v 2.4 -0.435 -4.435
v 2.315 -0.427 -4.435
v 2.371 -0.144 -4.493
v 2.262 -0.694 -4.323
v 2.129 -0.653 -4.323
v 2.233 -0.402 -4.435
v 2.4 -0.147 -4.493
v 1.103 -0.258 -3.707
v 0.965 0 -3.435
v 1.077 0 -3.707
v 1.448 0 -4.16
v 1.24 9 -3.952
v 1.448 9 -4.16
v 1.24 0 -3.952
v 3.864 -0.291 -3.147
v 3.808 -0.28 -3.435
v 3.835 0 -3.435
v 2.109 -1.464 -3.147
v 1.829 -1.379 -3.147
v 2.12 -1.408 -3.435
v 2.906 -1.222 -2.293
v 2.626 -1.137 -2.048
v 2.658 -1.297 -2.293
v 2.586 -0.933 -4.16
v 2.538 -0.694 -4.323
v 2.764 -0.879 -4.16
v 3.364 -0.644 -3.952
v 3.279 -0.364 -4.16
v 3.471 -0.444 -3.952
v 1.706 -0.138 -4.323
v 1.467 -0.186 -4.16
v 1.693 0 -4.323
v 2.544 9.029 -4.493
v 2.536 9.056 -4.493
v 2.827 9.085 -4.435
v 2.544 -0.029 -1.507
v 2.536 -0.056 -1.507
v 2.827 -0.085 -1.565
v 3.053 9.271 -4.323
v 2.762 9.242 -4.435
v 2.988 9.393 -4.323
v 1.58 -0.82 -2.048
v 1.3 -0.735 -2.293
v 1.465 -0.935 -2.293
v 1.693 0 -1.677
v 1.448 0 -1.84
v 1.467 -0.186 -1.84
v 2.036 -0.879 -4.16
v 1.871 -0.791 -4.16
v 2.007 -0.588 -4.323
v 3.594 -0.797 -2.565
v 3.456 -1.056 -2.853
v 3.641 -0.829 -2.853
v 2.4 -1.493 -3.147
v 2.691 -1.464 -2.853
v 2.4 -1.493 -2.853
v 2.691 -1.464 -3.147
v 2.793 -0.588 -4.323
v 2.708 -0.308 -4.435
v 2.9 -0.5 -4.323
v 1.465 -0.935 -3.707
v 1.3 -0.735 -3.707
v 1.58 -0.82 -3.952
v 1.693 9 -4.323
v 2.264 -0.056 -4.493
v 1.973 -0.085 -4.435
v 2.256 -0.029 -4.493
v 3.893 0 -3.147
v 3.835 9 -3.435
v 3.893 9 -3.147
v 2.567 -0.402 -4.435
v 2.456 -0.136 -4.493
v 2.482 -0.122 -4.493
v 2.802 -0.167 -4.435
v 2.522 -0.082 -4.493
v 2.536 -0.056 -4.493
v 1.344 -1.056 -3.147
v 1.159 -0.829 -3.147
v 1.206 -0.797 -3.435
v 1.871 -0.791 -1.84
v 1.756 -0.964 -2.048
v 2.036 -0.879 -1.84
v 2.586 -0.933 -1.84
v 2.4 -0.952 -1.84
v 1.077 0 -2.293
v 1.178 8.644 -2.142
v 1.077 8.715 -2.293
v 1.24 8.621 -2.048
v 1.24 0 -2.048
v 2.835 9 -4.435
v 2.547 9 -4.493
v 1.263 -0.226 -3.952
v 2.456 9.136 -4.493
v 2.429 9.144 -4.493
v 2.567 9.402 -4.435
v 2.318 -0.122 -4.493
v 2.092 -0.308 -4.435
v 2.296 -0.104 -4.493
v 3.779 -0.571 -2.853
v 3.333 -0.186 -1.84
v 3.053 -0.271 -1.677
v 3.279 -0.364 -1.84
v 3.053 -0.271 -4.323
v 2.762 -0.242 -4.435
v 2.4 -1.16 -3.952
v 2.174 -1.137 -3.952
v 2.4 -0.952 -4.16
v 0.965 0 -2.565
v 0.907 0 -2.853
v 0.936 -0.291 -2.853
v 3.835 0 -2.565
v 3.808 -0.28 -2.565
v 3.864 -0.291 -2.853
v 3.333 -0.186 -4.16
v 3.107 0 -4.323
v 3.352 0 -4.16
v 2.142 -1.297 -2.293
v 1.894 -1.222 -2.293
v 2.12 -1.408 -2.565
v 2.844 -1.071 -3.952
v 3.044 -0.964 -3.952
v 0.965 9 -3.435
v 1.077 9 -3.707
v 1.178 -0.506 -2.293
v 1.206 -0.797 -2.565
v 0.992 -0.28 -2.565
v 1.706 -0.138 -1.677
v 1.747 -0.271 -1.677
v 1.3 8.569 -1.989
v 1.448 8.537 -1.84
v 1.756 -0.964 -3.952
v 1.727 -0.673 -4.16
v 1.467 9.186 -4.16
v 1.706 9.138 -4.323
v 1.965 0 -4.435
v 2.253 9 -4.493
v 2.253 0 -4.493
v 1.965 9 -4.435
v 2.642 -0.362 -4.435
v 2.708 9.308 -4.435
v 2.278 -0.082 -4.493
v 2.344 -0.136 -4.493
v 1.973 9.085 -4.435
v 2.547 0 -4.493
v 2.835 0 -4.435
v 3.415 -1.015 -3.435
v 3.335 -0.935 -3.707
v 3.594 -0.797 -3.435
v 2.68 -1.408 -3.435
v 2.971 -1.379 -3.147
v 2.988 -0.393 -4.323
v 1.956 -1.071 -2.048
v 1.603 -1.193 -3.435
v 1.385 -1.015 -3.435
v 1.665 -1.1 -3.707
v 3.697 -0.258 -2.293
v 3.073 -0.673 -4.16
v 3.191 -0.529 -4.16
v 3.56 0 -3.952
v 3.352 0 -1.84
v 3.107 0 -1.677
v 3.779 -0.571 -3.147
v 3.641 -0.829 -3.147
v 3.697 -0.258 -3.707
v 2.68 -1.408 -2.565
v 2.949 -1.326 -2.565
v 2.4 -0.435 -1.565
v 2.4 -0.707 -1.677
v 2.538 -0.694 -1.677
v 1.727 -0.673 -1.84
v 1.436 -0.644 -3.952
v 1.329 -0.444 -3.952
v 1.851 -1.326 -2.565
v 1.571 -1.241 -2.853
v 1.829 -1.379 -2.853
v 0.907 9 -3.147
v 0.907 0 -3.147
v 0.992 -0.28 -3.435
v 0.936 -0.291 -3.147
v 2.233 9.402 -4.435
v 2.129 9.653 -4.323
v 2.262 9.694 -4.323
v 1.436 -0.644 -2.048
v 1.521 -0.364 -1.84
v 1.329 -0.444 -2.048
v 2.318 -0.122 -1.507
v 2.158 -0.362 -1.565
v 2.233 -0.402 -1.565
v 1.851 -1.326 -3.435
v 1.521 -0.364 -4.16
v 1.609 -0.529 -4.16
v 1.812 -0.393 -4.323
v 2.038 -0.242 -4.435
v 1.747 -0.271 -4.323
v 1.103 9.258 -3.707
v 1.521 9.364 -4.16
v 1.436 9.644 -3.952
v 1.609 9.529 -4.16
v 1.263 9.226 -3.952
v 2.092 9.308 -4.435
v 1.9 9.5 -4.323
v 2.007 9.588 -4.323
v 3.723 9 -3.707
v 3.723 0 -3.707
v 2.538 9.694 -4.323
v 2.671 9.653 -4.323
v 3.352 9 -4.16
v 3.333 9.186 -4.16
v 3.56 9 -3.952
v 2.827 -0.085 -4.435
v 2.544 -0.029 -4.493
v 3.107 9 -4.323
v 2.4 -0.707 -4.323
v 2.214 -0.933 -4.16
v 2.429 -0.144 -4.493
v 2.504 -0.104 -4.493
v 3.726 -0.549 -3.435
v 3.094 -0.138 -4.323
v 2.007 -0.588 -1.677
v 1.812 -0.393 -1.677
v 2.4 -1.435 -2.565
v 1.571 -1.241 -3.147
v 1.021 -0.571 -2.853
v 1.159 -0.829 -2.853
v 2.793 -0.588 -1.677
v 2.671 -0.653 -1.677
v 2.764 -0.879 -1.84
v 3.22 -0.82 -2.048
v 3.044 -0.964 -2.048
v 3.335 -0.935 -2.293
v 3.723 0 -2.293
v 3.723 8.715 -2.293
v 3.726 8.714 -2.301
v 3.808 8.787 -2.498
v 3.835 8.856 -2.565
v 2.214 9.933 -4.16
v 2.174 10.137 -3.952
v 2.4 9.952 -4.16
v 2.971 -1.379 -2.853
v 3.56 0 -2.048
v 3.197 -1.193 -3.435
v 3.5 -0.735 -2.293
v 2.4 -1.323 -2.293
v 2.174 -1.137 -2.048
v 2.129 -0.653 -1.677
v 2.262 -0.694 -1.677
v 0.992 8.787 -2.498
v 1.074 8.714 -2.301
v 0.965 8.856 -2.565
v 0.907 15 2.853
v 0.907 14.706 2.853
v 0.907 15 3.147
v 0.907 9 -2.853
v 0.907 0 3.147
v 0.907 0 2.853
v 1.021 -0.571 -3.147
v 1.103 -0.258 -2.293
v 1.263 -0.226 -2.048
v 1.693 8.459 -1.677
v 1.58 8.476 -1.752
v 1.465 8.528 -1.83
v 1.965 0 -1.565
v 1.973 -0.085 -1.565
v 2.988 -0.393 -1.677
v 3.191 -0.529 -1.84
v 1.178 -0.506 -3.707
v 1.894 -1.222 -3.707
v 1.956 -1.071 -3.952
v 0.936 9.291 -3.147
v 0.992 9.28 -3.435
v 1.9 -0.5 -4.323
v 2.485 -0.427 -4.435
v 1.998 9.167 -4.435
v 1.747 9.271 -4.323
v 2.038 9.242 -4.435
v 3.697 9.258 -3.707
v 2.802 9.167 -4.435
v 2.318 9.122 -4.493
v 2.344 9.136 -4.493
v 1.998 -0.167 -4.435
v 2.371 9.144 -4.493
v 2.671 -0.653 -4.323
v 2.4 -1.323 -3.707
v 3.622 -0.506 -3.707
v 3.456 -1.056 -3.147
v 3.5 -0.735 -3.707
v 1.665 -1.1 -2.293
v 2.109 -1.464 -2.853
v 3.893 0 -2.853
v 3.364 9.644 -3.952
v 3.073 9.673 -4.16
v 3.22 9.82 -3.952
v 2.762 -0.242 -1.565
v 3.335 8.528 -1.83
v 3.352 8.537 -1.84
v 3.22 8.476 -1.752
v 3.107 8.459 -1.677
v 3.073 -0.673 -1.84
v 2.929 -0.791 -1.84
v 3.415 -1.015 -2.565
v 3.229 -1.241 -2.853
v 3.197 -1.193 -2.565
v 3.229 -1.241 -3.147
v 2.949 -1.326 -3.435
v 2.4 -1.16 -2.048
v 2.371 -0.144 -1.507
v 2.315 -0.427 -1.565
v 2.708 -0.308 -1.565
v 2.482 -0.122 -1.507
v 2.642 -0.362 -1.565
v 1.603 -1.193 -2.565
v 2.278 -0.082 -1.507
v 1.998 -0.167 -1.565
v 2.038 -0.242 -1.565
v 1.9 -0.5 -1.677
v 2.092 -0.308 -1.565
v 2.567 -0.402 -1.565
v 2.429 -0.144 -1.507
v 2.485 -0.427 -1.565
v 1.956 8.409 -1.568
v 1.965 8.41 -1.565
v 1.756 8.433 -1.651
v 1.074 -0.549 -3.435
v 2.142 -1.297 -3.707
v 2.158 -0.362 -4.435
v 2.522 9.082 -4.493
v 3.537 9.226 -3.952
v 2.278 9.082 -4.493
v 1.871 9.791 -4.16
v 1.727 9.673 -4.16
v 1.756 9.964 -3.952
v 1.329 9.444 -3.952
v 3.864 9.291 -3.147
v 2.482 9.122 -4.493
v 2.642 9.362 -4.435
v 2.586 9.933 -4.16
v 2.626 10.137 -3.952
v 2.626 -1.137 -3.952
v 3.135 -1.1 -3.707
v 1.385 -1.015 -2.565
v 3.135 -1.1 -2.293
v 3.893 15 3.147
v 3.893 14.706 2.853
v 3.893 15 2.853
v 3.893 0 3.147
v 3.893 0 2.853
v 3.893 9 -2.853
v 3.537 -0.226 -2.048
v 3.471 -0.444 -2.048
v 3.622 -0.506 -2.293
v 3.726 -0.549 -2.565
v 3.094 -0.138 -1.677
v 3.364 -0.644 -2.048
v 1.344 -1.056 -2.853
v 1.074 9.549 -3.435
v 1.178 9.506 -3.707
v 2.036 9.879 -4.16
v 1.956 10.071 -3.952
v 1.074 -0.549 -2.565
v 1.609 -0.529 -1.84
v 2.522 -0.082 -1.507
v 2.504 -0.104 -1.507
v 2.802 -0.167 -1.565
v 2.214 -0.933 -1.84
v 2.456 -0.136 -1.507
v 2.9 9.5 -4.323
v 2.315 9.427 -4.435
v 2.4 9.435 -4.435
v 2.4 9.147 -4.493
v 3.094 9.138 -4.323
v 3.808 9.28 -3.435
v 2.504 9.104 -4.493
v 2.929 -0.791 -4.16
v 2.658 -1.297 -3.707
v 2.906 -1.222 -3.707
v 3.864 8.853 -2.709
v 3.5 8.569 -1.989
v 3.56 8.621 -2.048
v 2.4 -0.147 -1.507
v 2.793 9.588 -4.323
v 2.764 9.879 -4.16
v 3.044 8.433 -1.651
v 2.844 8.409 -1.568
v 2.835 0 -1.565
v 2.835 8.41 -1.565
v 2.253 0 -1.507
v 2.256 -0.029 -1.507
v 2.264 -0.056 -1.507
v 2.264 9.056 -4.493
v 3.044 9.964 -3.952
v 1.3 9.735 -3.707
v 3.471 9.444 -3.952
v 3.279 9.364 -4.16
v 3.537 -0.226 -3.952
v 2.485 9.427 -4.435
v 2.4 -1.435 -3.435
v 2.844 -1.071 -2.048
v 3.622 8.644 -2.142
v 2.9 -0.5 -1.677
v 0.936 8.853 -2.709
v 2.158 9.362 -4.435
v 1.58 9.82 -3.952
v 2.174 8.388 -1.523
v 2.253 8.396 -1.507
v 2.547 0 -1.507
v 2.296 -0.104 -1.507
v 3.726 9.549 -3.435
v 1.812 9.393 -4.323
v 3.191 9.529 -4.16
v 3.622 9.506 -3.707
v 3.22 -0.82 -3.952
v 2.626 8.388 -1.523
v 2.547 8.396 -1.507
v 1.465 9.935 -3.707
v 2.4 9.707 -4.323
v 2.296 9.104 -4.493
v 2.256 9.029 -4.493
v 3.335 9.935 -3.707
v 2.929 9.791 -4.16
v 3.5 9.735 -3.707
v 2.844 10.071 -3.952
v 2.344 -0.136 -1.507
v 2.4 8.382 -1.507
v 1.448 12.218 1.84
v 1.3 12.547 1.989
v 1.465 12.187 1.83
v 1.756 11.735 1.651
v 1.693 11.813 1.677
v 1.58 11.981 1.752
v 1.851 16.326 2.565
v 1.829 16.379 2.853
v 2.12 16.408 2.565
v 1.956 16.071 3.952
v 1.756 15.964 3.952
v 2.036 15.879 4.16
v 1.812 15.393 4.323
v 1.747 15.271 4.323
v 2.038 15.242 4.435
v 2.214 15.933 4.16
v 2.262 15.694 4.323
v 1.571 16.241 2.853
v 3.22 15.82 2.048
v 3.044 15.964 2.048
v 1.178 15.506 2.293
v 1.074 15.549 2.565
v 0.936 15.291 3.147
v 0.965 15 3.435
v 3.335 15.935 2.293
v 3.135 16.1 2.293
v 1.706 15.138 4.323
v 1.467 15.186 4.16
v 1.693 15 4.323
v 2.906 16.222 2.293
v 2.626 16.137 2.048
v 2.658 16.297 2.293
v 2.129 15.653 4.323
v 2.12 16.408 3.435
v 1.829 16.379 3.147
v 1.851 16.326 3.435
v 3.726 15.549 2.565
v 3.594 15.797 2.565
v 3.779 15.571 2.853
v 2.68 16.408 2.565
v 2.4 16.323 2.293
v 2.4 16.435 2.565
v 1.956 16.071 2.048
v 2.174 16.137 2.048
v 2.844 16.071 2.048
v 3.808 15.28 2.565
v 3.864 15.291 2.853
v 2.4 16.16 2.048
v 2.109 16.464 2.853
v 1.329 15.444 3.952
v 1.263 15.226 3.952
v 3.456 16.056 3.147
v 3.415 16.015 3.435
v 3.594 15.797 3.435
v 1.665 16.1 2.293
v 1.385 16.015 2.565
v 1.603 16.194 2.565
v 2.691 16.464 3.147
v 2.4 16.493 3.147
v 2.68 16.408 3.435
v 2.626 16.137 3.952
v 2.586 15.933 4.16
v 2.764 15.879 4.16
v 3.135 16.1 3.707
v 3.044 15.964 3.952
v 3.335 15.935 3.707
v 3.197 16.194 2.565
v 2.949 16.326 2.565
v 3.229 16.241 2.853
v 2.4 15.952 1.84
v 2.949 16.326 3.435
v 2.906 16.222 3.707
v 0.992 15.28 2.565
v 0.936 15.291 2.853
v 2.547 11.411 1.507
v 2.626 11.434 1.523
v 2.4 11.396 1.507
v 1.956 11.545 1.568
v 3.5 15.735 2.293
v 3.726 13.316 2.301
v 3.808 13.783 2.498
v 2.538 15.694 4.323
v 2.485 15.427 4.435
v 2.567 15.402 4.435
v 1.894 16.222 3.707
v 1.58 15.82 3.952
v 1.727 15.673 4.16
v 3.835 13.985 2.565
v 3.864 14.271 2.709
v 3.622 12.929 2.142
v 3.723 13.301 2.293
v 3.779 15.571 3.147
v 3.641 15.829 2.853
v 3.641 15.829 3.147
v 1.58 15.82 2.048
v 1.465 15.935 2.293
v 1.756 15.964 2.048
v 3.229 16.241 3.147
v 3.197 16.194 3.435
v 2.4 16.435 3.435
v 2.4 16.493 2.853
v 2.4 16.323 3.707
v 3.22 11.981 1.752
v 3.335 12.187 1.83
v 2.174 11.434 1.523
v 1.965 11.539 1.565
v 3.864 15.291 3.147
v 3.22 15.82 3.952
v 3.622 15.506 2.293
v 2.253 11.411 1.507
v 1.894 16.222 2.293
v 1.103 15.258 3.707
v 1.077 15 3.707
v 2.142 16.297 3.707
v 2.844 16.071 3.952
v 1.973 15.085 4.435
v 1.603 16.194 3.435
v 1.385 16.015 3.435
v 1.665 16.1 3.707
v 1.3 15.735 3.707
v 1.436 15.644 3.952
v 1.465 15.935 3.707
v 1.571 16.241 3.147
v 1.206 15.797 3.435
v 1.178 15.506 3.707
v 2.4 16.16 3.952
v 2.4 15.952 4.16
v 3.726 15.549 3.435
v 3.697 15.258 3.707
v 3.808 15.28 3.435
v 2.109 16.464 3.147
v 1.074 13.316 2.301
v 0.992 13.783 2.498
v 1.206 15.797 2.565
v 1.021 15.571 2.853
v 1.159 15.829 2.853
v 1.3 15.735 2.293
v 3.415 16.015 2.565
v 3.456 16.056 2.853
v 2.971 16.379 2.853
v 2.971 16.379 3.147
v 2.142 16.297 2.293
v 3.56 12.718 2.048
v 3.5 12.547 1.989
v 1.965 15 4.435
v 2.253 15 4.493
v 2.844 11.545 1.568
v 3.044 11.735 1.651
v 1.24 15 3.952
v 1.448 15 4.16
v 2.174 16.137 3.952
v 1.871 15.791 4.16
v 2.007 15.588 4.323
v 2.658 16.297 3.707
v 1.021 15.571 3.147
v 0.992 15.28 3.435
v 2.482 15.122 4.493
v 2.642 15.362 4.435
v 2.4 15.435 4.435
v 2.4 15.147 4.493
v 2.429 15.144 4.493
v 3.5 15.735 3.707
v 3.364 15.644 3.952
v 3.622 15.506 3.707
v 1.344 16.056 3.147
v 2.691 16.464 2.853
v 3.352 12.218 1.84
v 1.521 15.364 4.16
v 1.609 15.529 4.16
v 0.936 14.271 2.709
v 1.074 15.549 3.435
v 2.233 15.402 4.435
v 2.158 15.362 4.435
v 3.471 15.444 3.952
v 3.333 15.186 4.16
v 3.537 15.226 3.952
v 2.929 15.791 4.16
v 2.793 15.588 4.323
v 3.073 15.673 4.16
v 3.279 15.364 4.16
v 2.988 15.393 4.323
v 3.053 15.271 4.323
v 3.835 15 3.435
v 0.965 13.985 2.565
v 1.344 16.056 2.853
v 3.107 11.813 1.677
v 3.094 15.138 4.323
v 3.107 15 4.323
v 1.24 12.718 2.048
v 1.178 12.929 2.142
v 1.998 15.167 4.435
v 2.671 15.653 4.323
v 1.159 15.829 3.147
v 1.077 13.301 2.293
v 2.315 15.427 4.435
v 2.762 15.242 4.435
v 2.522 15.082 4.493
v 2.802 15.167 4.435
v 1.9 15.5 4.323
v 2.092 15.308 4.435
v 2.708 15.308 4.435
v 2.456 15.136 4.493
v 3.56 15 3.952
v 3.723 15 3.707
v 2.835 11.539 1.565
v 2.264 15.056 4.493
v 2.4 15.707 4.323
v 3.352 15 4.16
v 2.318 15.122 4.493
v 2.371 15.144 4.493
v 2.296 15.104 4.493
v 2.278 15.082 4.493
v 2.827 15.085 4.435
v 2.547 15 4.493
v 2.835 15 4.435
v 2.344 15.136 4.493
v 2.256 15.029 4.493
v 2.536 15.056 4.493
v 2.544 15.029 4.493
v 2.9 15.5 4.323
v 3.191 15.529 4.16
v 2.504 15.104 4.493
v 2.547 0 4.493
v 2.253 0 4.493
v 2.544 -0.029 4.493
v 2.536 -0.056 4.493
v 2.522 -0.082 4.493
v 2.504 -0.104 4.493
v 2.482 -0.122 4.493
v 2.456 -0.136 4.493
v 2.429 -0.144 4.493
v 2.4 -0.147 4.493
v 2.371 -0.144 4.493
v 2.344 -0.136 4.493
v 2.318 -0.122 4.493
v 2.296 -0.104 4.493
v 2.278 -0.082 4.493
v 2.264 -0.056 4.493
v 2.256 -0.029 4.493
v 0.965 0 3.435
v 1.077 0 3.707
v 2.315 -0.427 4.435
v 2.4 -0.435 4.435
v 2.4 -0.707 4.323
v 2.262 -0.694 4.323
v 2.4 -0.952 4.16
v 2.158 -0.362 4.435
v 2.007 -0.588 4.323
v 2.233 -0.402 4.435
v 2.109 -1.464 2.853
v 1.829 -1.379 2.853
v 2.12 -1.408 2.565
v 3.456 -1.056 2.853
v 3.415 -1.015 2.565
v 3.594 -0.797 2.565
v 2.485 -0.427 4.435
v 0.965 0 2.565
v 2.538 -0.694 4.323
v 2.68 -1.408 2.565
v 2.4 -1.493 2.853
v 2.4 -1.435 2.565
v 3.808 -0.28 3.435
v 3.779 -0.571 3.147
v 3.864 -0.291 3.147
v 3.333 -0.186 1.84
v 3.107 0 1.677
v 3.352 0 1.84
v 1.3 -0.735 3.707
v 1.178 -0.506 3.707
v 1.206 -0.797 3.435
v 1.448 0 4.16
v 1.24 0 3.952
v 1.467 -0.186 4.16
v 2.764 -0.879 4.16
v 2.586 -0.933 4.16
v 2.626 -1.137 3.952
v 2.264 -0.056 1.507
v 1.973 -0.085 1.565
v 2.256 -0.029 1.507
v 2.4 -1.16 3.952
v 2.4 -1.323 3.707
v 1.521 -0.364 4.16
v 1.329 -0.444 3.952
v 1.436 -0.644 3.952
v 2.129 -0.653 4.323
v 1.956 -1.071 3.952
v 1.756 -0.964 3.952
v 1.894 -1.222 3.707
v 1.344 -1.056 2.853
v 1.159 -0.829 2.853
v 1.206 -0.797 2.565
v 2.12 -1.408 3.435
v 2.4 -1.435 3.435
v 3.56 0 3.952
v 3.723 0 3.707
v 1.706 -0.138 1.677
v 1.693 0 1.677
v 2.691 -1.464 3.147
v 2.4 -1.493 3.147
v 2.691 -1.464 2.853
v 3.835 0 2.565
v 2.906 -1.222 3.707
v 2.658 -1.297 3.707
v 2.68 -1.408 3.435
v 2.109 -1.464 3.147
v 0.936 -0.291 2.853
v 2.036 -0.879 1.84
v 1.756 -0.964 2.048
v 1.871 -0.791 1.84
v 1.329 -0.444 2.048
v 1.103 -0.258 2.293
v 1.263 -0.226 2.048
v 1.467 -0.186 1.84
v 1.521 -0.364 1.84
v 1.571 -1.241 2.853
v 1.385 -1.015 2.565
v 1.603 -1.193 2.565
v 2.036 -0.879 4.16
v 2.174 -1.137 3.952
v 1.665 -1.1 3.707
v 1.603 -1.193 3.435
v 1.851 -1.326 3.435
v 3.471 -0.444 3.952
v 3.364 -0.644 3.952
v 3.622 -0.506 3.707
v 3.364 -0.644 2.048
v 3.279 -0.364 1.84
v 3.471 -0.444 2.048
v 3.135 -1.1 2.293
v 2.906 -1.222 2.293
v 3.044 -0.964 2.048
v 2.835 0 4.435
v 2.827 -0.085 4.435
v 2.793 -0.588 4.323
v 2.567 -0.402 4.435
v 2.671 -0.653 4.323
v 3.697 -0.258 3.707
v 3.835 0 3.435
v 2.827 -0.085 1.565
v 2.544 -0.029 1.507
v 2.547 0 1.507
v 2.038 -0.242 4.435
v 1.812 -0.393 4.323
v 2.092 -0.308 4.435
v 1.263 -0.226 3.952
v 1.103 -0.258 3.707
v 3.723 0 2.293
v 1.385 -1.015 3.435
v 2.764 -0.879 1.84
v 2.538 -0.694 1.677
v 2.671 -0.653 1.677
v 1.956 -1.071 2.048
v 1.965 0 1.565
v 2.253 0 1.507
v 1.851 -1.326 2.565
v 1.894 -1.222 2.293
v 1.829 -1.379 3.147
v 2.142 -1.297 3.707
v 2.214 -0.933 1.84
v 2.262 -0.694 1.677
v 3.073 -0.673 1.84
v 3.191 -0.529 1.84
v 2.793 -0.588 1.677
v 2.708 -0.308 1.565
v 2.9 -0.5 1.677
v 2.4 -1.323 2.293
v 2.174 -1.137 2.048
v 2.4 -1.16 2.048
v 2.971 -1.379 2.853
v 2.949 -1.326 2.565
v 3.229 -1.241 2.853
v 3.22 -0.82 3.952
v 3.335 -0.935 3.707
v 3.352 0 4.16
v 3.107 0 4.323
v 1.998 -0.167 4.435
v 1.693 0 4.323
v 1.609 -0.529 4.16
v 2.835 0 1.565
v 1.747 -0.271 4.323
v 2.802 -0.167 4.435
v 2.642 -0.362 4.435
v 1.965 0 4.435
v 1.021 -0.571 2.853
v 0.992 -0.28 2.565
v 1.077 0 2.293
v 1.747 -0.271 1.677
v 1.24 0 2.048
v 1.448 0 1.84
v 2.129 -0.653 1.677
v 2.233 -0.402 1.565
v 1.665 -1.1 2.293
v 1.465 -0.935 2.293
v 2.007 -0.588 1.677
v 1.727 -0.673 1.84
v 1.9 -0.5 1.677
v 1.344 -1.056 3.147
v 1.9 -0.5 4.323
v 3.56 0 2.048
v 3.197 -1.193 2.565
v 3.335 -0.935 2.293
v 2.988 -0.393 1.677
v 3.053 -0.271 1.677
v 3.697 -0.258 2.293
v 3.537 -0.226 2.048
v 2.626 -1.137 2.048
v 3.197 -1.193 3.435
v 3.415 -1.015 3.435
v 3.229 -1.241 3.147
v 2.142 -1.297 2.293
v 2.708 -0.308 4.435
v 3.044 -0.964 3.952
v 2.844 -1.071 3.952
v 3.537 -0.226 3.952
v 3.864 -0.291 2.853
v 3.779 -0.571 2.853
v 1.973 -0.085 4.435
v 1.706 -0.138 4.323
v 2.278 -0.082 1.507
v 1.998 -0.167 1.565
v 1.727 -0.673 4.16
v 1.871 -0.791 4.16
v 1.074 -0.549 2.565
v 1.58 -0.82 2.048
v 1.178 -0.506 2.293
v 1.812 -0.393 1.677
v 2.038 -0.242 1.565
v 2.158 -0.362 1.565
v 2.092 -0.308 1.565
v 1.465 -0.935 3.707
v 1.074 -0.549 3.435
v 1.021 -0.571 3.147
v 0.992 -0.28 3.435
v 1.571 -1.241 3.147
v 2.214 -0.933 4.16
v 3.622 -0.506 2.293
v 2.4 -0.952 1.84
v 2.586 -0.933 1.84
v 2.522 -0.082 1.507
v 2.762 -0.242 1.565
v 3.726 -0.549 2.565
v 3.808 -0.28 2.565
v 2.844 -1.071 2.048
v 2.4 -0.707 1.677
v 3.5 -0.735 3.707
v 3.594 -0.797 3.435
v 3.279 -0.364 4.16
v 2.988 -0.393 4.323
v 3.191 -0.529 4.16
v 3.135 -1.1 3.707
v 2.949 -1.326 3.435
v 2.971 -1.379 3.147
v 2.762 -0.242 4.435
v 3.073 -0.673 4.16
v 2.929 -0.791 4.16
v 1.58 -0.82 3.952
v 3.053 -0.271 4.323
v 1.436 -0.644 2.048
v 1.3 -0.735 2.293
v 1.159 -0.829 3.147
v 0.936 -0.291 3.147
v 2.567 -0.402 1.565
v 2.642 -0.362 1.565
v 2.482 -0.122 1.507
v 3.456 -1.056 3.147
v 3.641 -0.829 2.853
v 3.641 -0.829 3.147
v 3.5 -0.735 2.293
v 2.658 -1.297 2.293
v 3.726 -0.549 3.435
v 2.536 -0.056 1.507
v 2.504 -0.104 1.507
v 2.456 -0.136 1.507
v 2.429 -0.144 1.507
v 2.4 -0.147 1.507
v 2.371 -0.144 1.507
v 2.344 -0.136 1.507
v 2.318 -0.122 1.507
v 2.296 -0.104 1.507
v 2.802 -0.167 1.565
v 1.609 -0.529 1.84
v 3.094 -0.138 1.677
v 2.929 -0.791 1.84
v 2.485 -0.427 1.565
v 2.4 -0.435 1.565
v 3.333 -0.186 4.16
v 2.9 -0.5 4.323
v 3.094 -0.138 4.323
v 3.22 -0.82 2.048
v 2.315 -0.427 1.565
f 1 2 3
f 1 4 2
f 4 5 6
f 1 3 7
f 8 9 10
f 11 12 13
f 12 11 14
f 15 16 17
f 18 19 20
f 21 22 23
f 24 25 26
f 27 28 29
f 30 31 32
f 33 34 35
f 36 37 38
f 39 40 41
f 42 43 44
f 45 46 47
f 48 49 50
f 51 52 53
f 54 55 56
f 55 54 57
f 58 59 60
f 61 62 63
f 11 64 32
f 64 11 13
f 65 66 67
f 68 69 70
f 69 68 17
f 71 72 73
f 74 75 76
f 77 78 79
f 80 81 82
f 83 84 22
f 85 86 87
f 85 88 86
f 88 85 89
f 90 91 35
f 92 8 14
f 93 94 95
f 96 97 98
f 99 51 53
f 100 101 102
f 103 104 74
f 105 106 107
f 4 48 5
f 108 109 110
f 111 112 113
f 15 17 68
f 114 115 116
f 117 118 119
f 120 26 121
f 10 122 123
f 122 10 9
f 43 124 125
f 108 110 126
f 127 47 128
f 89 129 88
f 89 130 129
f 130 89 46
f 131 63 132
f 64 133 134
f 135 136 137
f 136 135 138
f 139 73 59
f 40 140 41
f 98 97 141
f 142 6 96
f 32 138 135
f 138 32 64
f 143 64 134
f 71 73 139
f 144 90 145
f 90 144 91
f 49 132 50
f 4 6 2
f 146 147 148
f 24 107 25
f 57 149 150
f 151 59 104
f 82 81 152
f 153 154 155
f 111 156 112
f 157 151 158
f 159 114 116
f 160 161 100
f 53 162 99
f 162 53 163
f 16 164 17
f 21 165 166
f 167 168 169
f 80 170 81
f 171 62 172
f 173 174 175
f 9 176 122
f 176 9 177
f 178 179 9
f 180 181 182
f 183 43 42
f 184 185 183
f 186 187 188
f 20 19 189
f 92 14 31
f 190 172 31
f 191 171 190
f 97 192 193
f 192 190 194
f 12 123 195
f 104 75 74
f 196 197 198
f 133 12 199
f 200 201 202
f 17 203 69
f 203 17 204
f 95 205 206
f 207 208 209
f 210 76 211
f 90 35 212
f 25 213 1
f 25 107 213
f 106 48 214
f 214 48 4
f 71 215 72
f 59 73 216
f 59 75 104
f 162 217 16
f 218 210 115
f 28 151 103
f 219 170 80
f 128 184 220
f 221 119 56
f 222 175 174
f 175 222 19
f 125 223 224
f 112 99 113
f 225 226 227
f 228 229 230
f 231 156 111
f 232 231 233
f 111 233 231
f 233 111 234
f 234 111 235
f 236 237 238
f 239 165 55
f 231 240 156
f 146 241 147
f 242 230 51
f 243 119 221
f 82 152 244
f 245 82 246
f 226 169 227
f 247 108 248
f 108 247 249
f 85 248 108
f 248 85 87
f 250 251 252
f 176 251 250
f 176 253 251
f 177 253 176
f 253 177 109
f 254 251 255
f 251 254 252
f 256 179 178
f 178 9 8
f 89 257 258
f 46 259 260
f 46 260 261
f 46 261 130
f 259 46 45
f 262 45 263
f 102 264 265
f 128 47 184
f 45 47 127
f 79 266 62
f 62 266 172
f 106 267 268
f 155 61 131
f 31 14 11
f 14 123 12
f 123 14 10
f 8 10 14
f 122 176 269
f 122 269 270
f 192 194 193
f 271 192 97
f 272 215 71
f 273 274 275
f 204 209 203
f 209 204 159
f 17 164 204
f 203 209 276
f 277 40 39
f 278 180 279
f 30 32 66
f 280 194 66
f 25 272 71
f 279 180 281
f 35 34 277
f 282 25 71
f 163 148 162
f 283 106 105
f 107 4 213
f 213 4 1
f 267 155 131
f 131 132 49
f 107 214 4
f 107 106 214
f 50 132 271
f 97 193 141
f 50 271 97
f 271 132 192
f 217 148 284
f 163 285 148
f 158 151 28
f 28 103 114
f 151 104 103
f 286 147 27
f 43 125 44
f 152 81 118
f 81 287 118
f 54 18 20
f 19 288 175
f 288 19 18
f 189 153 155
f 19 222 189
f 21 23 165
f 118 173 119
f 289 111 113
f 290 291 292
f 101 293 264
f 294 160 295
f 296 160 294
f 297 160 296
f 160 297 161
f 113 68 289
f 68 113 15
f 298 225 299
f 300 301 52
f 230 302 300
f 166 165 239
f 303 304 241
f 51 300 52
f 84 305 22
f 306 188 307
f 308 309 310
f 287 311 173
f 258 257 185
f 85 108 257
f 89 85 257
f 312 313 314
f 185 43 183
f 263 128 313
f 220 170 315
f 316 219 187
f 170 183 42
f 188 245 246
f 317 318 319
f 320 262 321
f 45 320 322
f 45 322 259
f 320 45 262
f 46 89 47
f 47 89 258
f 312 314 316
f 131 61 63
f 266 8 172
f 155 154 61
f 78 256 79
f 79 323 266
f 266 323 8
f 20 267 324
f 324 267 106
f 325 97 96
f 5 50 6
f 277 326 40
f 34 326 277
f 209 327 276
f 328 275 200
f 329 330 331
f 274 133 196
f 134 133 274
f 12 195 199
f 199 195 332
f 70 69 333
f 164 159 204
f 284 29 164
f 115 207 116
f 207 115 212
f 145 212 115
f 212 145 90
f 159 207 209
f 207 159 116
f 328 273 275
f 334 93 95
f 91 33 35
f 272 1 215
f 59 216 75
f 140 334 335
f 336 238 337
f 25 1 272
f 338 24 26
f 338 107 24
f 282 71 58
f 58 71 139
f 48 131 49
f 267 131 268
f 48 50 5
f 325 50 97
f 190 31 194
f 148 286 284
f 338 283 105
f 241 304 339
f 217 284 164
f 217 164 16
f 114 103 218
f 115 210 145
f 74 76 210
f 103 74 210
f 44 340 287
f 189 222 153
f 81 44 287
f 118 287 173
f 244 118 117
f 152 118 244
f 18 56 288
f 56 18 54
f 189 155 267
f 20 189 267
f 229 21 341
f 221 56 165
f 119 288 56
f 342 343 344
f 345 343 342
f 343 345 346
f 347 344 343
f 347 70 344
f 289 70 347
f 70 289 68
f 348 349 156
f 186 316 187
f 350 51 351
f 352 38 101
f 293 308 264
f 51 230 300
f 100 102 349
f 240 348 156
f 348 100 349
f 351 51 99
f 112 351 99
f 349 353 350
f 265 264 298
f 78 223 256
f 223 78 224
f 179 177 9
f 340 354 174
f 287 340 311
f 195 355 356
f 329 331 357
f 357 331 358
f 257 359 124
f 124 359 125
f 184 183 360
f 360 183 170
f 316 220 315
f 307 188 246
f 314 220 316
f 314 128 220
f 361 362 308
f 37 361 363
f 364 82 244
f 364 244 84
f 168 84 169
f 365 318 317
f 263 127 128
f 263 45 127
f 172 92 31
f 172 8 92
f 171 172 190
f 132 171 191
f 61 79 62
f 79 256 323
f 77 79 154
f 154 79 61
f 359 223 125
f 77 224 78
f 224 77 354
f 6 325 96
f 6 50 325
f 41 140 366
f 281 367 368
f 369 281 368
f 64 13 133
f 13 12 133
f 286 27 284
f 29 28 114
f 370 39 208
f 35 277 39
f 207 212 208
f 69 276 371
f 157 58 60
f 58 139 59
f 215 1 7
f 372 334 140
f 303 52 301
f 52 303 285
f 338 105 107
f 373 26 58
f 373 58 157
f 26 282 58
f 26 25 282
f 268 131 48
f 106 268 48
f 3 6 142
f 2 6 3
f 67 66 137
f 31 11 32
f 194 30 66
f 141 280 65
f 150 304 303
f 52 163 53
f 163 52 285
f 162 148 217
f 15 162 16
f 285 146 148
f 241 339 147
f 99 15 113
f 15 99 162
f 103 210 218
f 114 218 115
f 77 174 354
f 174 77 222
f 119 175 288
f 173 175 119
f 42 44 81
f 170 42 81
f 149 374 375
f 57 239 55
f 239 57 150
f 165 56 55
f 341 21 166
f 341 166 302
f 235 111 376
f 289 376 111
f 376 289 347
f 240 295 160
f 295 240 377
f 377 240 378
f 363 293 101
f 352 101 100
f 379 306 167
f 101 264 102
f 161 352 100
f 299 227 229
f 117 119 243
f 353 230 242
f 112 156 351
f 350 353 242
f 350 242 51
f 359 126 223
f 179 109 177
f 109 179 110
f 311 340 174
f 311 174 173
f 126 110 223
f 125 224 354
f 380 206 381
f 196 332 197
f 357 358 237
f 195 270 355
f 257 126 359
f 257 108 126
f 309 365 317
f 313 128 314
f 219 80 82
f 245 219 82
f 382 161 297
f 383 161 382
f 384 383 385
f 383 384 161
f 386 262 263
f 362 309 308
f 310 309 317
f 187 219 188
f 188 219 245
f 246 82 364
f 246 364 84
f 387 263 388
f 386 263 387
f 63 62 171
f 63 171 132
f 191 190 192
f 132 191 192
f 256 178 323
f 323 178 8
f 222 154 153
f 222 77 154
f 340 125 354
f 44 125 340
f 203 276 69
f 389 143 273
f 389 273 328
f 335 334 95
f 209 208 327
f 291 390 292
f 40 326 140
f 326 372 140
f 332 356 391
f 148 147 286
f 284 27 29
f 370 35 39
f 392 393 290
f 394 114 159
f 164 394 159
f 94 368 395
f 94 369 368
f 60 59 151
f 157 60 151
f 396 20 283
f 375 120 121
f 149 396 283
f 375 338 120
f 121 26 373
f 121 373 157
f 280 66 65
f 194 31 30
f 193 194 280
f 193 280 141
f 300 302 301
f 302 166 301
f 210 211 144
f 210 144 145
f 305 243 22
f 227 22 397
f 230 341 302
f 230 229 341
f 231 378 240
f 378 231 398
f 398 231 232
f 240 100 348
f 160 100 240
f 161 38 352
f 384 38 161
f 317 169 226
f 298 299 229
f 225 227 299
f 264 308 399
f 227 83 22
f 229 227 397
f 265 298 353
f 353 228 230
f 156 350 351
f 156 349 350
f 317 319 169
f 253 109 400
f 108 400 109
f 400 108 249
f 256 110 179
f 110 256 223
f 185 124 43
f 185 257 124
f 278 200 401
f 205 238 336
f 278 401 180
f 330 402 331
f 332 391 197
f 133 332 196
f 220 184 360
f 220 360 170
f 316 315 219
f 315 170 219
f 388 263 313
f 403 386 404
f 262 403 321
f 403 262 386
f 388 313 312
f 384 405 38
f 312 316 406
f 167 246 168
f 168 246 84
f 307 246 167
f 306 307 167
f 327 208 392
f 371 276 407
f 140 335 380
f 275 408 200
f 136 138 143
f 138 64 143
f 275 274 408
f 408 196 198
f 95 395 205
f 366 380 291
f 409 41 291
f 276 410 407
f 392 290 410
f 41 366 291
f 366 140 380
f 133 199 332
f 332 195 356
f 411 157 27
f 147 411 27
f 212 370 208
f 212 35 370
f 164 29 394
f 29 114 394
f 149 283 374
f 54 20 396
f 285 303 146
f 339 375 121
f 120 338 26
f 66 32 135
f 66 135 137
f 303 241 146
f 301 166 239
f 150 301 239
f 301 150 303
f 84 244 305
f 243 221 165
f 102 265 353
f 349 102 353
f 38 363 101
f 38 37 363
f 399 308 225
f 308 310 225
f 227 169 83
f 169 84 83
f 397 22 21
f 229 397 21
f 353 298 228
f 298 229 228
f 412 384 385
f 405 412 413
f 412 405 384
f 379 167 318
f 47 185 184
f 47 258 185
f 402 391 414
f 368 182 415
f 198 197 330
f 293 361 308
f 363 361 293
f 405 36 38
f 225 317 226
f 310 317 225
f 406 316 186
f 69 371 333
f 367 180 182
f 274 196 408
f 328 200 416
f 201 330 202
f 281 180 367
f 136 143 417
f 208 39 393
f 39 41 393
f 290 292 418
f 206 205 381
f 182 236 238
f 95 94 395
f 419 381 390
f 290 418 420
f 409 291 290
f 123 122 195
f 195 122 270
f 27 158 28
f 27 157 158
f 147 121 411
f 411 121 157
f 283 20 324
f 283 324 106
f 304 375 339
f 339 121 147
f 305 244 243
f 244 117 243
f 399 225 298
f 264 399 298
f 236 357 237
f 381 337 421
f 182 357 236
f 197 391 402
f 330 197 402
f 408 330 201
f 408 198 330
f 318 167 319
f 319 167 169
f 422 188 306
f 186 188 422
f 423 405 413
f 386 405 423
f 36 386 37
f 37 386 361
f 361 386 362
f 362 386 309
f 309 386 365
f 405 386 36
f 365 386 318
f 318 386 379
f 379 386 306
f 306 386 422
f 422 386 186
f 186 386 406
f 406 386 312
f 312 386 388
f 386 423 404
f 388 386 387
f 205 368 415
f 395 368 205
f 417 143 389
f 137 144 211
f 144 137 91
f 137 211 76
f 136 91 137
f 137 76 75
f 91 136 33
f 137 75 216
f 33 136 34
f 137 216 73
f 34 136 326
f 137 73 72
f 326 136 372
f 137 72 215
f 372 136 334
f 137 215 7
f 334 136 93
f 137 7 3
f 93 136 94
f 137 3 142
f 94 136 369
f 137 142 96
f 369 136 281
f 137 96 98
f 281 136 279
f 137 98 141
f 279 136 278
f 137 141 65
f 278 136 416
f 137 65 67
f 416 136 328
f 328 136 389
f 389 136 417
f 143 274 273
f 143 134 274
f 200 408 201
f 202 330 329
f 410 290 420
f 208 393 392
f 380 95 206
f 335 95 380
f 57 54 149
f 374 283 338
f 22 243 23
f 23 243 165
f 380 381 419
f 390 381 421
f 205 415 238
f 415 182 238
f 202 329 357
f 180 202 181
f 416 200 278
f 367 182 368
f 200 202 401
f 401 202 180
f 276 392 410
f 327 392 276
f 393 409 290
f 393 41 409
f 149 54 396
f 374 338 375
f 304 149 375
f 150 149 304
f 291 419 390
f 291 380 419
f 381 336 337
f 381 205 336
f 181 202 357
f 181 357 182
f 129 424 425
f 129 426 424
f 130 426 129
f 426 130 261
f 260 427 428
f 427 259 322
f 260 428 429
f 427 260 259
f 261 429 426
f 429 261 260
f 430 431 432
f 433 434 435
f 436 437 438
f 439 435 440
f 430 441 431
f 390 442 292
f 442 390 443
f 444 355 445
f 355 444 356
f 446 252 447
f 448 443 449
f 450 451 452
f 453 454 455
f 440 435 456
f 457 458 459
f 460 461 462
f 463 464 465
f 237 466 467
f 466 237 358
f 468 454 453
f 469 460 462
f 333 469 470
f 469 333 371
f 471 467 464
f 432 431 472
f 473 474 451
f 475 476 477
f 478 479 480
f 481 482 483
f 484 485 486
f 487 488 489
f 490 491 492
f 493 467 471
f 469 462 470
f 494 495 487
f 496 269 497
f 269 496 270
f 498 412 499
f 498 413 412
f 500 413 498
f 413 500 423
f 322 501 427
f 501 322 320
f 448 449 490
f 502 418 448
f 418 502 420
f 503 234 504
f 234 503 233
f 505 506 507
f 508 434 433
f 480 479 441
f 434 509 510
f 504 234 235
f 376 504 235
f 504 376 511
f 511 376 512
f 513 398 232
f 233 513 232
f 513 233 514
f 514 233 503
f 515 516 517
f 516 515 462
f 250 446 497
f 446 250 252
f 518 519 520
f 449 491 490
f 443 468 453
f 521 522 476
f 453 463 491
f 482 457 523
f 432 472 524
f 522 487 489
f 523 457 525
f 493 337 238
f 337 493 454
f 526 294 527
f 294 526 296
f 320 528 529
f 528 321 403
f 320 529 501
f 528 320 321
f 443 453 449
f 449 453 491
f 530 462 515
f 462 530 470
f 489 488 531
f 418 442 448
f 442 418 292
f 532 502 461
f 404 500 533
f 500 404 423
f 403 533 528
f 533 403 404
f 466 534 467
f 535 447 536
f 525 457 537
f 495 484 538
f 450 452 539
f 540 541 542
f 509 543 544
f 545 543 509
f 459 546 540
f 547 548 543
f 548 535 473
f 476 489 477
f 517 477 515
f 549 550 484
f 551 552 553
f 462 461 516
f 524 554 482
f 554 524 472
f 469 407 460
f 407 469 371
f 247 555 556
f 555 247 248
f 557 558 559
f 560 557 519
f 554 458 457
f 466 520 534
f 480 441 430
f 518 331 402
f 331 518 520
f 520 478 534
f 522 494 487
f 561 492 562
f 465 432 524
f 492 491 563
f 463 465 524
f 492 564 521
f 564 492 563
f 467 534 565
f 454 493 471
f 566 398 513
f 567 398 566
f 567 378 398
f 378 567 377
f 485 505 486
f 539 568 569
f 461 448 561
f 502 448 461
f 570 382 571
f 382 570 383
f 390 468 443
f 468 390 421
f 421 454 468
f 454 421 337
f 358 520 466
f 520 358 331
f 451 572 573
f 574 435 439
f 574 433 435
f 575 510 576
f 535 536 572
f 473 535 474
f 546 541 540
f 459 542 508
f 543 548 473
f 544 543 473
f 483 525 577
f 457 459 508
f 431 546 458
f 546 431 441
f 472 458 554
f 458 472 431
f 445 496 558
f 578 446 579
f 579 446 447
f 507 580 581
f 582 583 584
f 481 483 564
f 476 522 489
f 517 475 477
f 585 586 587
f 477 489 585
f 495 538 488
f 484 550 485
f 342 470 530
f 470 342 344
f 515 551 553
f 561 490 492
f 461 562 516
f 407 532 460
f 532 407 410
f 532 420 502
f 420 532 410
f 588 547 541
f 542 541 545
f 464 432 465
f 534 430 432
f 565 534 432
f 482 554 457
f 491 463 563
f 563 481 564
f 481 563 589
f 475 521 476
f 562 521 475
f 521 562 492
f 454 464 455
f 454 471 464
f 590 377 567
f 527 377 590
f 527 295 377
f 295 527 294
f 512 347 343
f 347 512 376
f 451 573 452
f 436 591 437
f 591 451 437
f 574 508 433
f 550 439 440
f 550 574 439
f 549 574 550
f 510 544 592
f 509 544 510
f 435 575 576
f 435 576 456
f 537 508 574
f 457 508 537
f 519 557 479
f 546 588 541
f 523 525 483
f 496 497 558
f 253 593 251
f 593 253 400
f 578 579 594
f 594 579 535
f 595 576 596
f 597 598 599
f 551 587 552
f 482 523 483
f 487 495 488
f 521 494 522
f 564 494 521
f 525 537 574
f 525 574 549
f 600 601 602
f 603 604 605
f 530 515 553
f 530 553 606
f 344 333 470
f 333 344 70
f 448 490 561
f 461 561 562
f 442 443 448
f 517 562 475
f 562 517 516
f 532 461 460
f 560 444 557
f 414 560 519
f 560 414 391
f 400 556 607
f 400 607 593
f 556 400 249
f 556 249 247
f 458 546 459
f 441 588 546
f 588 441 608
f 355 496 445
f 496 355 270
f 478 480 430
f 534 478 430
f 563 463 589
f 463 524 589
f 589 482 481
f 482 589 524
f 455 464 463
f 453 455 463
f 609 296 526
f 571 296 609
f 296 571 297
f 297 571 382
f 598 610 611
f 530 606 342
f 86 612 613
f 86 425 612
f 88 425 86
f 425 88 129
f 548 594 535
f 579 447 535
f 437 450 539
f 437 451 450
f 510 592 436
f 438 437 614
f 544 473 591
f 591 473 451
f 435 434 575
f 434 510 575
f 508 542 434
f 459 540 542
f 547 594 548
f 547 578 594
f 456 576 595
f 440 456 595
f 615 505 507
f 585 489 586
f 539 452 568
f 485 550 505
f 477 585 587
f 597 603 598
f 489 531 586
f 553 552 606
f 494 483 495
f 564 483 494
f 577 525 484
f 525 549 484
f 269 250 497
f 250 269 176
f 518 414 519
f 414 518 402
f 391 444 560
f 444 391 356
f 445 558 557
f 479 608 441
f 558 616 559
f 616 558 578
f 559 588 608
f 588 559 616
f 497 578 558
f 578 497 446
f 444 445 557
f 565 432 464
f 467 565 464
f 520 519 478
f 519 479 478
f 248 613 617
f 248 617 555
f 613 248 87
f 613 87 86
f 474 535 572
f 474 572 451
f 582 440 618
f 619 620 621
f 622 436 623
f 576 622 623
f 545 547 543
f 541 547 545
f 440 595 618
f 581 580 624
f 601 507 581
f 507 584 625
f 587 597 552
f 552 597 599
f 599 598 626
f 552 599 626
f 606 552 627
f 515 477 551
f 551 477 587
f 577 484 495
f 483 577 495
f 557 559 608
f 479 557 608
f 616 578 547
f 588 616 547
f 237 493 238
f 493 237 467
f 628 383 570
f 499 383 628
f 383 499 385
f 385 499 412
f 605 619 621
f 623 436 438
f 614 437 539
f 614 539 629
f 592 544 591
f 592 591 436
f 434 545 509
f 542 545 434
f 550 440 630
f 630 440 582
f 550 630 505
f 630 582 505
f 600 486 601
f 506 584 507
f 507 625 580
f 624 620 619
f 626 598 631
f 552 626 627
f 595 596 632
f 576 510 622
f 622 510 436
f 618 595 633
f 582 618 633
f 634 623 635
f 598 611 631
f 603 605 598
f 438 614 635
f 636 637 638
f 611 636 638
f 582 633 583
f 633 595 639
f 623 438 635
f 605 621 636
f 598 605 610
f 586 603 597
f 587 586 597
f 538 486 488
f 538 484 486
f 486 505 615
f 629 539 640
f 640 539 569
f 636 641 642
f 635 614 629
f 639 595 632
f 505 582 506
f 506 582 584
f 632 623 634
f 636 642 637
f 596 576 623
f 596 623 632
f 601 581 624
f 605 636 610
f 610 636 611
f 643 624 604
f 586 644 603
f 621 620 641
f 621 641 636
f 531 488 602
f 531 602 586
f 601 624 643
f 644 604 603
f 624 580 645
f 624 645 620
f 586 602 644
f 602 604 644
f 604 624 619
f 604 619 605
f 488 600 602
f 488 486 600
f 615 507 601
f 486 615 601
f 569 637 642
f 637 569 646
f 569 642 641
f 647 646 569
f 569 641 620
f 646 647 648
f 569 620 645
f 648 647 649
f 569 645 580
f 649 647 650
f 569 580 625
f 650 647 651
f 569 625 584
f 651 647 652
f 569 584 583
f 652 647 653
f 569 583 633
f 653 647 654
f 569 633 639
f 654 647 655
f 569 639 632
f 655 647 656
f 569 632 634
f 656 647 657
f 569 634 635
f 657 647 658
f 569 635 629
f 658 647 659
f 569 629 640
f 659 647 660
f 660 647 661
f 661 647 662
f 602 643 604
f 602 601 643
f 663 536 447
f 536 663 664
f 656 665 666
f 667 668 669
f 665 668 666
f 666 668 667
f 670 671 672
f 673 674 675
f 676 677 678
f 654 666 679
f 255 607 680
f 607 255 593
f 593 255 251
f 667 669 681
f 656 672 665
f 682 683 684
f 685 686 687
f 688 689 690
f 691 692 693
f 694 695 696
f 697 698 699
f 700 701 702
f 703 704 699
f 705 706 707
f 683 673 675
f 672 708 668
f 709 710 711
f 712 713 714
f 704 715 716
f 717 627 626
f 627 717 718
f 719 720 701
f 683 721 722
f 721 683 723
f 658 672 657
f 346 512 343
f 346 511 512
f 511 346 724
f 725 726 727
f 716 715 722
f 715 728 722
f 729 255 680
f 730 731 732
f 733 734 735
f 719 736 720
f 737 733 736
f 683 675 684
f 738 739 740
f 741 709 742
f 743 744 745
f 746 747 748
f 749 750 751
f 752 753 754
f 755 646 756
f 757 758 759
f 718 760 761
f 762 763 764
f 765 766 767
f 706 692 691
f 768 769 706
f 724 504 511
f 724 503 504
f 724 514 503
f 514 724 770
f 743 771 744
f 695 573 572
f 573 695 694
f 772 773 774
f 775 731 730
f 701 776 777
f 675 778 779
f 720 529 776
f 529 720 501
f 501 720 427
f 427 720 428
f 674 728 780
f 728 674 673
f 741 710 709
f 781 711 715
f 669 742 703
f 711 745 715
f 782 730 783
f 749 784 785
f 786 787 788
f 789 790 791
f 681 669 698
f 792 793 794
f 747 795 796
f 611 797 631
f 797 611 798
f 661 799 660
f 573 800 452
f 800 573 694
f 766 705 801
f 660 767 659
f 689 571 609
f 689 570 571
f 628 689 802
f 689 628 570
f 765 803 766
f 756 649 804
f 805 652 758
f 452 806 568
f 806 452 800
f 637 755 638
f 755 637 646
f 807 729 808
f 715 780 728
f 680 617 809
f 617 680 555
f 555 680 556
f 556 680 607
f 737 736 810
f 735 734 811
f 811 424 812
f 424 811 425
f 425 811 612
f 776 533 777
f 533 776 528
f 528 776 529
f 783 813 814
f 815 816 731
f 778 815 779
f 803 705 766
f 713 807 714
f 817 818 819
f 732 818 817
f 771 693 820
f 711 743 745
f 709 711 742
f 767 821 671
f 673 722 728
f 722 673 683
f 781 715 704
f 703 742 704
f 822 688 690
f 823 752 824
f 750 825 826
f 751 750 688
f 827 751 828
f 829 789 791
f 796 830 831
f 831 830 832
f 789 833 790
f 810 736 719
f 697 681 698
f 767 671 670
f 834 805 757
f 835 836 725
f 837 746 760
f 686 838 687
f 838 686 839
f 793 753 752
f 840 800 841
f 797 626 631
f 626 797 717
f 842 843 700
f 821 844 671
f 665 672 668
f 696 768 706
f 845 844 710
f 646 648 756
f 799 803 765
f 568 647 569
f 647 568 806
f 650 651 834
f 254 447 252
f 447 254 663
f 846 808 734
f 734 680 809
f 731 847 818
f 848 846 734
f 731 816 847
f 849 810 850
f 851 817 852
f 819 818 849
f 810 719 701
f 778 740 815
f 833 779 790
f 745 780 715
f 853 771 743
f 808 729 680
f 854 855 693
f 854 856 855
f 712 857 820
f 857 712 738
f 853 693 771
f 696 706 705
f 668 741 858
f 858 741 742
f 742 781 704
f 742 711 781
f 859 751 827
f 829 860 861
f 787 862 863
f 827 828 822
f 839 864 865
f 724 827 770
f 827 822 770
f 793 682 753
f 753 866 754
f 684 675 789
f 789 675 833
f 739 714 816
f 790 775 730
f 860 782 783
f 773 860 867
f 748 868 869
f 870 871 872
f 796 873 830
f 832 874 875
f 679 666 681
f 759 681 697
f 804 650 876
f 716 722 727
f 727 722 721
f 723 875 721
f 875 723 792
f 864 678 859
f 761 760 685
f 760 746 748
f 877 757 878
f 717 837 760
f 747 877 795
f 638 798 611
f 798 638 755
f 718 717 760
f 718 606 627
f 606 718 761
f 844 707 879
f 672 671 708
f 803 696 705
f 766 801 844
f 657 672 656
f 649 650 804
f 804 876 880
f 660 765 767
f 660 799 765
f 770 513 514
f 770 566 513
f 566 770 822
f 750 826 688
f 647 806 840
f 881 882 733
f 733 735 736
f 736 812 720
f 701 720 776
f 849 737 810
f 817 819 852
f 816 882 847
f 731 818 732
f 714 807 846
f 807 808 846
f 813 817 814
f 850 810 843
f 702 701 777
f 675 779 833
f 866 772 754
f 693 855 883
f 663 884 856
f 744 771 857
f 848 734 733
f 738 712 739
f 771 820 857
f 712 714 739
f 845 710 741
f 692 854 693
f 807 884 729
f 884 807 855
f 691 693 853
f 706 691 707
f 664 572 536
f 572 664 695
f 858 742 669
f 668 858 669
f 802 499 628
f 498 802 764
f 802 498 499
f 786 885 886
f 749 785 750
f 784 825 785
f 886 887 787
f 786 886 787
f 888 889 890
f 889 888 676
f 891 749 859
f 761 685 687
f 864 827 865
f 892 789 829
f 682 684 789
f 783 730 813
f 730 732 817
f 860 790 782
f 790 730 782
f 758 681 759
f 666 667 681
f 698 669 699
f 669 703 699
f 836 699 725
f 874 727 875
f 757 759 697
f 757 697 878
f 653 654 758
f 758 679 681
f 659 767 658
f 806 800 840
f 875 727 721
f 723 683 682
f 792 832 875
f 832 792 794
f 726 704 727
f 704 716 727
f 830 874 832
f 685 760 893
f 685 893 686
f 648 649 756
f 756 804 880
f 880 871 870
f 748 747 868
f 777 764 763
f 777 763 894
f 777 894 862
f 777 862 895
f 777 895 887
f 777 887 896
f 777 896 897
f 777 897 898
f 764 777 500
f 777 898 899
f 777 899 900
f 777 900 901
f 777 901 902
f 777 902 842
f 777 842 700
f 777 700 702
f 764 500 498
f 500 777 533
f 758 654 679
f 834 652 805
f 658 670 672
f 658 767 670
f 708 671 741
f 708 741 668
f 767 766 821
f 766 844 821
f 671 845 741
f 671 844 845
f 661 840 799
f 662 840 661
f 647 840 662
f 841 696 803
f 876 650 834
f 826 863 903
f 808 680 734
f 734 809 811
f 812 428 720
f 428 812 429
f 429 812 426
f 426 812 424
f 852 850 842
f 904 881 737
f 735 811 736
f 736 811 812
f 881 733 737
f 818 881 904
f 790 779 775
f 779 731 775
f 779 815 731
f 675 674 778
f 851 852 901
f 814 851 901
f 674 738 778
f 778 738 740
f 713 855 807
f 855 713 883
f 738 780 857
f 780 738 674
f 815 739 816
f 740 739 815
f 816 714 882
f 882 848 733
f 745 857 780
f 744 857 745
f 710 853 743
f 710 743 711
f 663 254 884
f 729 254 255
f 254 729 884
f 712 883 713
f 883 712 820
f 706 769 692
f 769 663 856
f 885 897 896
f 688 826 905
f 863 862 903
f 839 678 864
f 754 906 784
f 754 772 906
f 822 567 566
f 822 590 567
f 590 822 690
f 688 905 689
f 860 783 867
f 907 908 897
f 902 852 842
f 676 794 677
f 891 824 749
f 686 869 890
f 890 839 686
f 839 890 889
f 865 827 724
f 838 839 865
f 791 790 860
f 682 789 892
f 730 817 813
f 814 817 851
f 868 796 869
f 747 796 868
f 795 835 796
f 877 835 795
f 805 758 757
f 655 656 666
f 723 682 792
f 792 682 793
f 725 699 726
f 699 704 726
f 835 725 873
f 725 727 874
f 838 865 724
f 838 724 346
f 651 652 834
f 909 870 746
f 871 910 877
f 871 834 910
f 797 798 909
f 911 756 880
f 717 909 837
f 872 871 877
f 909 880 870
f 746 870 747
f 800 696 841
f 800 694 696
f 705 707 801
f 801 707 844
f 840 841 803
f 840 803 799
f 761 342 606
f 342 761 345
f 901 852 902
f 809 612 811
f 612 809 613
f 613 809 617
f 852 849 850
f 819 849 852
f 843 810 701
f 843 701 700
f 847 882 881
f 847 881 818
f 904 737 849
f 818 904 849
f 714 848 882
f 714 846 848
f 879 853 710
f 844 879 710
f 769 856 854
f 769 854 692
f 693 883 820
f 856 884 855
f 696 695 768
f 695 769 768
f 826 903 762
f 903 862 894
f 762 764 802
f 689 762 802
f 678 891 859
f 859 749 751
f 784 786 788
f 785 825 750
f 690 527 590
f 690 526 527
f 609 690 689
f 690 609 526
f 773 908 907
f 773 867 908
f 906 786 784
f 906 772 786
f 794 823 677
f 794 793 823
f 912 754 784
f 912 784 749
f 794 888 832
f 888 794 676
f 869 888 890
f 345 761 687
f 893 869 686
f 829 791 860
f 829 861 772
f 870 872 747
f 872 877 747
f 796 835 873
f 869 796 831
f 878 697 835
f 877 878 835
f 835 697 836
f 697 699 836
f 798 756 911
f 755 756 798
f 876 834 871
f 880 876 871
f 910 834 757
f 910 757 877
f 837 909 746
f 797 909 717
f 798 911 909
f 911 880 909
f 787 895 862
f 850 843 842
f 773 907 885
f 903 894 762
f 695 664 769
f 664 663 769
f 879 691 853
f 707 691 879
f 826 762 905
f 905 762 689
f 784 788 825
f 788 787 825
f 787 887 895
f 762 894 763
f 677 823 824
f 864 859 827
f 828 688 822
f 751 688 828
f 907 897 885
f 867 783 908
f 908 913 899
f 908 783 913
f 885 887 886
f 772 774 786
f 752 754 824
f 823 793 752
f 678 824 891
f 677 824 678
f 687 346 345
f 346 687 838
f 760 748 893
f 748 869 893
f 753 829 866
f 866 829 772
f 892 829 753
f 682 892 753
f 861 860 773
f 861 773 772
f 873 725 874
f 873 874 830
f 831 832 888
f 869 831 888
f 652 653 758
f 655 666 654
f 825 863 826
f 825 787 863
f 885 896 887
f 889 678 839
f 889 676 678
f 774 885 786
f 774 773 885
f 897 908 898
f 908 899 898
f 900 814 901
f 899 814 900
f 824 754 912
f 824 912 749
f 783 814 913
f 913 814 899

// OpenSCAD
//Swipes a body through space using polygonal trajectory. Vertices are passed as array of 3d poses.
//Project: published for np-f adapter, can be used everywhere to route cables, hoses, etc. 
module worm(path) {
  for(i=[0:len(path)-2]) {
    hull() {
      translate(path[i])children();
      translate(path[i+1])children();
    }
  }
}
worm(path=[[2.4,0,-3],[2.4,9,-3],[2.4,15,3],[2.4,0,3]])sphere(r=1.5,$fn=32);
